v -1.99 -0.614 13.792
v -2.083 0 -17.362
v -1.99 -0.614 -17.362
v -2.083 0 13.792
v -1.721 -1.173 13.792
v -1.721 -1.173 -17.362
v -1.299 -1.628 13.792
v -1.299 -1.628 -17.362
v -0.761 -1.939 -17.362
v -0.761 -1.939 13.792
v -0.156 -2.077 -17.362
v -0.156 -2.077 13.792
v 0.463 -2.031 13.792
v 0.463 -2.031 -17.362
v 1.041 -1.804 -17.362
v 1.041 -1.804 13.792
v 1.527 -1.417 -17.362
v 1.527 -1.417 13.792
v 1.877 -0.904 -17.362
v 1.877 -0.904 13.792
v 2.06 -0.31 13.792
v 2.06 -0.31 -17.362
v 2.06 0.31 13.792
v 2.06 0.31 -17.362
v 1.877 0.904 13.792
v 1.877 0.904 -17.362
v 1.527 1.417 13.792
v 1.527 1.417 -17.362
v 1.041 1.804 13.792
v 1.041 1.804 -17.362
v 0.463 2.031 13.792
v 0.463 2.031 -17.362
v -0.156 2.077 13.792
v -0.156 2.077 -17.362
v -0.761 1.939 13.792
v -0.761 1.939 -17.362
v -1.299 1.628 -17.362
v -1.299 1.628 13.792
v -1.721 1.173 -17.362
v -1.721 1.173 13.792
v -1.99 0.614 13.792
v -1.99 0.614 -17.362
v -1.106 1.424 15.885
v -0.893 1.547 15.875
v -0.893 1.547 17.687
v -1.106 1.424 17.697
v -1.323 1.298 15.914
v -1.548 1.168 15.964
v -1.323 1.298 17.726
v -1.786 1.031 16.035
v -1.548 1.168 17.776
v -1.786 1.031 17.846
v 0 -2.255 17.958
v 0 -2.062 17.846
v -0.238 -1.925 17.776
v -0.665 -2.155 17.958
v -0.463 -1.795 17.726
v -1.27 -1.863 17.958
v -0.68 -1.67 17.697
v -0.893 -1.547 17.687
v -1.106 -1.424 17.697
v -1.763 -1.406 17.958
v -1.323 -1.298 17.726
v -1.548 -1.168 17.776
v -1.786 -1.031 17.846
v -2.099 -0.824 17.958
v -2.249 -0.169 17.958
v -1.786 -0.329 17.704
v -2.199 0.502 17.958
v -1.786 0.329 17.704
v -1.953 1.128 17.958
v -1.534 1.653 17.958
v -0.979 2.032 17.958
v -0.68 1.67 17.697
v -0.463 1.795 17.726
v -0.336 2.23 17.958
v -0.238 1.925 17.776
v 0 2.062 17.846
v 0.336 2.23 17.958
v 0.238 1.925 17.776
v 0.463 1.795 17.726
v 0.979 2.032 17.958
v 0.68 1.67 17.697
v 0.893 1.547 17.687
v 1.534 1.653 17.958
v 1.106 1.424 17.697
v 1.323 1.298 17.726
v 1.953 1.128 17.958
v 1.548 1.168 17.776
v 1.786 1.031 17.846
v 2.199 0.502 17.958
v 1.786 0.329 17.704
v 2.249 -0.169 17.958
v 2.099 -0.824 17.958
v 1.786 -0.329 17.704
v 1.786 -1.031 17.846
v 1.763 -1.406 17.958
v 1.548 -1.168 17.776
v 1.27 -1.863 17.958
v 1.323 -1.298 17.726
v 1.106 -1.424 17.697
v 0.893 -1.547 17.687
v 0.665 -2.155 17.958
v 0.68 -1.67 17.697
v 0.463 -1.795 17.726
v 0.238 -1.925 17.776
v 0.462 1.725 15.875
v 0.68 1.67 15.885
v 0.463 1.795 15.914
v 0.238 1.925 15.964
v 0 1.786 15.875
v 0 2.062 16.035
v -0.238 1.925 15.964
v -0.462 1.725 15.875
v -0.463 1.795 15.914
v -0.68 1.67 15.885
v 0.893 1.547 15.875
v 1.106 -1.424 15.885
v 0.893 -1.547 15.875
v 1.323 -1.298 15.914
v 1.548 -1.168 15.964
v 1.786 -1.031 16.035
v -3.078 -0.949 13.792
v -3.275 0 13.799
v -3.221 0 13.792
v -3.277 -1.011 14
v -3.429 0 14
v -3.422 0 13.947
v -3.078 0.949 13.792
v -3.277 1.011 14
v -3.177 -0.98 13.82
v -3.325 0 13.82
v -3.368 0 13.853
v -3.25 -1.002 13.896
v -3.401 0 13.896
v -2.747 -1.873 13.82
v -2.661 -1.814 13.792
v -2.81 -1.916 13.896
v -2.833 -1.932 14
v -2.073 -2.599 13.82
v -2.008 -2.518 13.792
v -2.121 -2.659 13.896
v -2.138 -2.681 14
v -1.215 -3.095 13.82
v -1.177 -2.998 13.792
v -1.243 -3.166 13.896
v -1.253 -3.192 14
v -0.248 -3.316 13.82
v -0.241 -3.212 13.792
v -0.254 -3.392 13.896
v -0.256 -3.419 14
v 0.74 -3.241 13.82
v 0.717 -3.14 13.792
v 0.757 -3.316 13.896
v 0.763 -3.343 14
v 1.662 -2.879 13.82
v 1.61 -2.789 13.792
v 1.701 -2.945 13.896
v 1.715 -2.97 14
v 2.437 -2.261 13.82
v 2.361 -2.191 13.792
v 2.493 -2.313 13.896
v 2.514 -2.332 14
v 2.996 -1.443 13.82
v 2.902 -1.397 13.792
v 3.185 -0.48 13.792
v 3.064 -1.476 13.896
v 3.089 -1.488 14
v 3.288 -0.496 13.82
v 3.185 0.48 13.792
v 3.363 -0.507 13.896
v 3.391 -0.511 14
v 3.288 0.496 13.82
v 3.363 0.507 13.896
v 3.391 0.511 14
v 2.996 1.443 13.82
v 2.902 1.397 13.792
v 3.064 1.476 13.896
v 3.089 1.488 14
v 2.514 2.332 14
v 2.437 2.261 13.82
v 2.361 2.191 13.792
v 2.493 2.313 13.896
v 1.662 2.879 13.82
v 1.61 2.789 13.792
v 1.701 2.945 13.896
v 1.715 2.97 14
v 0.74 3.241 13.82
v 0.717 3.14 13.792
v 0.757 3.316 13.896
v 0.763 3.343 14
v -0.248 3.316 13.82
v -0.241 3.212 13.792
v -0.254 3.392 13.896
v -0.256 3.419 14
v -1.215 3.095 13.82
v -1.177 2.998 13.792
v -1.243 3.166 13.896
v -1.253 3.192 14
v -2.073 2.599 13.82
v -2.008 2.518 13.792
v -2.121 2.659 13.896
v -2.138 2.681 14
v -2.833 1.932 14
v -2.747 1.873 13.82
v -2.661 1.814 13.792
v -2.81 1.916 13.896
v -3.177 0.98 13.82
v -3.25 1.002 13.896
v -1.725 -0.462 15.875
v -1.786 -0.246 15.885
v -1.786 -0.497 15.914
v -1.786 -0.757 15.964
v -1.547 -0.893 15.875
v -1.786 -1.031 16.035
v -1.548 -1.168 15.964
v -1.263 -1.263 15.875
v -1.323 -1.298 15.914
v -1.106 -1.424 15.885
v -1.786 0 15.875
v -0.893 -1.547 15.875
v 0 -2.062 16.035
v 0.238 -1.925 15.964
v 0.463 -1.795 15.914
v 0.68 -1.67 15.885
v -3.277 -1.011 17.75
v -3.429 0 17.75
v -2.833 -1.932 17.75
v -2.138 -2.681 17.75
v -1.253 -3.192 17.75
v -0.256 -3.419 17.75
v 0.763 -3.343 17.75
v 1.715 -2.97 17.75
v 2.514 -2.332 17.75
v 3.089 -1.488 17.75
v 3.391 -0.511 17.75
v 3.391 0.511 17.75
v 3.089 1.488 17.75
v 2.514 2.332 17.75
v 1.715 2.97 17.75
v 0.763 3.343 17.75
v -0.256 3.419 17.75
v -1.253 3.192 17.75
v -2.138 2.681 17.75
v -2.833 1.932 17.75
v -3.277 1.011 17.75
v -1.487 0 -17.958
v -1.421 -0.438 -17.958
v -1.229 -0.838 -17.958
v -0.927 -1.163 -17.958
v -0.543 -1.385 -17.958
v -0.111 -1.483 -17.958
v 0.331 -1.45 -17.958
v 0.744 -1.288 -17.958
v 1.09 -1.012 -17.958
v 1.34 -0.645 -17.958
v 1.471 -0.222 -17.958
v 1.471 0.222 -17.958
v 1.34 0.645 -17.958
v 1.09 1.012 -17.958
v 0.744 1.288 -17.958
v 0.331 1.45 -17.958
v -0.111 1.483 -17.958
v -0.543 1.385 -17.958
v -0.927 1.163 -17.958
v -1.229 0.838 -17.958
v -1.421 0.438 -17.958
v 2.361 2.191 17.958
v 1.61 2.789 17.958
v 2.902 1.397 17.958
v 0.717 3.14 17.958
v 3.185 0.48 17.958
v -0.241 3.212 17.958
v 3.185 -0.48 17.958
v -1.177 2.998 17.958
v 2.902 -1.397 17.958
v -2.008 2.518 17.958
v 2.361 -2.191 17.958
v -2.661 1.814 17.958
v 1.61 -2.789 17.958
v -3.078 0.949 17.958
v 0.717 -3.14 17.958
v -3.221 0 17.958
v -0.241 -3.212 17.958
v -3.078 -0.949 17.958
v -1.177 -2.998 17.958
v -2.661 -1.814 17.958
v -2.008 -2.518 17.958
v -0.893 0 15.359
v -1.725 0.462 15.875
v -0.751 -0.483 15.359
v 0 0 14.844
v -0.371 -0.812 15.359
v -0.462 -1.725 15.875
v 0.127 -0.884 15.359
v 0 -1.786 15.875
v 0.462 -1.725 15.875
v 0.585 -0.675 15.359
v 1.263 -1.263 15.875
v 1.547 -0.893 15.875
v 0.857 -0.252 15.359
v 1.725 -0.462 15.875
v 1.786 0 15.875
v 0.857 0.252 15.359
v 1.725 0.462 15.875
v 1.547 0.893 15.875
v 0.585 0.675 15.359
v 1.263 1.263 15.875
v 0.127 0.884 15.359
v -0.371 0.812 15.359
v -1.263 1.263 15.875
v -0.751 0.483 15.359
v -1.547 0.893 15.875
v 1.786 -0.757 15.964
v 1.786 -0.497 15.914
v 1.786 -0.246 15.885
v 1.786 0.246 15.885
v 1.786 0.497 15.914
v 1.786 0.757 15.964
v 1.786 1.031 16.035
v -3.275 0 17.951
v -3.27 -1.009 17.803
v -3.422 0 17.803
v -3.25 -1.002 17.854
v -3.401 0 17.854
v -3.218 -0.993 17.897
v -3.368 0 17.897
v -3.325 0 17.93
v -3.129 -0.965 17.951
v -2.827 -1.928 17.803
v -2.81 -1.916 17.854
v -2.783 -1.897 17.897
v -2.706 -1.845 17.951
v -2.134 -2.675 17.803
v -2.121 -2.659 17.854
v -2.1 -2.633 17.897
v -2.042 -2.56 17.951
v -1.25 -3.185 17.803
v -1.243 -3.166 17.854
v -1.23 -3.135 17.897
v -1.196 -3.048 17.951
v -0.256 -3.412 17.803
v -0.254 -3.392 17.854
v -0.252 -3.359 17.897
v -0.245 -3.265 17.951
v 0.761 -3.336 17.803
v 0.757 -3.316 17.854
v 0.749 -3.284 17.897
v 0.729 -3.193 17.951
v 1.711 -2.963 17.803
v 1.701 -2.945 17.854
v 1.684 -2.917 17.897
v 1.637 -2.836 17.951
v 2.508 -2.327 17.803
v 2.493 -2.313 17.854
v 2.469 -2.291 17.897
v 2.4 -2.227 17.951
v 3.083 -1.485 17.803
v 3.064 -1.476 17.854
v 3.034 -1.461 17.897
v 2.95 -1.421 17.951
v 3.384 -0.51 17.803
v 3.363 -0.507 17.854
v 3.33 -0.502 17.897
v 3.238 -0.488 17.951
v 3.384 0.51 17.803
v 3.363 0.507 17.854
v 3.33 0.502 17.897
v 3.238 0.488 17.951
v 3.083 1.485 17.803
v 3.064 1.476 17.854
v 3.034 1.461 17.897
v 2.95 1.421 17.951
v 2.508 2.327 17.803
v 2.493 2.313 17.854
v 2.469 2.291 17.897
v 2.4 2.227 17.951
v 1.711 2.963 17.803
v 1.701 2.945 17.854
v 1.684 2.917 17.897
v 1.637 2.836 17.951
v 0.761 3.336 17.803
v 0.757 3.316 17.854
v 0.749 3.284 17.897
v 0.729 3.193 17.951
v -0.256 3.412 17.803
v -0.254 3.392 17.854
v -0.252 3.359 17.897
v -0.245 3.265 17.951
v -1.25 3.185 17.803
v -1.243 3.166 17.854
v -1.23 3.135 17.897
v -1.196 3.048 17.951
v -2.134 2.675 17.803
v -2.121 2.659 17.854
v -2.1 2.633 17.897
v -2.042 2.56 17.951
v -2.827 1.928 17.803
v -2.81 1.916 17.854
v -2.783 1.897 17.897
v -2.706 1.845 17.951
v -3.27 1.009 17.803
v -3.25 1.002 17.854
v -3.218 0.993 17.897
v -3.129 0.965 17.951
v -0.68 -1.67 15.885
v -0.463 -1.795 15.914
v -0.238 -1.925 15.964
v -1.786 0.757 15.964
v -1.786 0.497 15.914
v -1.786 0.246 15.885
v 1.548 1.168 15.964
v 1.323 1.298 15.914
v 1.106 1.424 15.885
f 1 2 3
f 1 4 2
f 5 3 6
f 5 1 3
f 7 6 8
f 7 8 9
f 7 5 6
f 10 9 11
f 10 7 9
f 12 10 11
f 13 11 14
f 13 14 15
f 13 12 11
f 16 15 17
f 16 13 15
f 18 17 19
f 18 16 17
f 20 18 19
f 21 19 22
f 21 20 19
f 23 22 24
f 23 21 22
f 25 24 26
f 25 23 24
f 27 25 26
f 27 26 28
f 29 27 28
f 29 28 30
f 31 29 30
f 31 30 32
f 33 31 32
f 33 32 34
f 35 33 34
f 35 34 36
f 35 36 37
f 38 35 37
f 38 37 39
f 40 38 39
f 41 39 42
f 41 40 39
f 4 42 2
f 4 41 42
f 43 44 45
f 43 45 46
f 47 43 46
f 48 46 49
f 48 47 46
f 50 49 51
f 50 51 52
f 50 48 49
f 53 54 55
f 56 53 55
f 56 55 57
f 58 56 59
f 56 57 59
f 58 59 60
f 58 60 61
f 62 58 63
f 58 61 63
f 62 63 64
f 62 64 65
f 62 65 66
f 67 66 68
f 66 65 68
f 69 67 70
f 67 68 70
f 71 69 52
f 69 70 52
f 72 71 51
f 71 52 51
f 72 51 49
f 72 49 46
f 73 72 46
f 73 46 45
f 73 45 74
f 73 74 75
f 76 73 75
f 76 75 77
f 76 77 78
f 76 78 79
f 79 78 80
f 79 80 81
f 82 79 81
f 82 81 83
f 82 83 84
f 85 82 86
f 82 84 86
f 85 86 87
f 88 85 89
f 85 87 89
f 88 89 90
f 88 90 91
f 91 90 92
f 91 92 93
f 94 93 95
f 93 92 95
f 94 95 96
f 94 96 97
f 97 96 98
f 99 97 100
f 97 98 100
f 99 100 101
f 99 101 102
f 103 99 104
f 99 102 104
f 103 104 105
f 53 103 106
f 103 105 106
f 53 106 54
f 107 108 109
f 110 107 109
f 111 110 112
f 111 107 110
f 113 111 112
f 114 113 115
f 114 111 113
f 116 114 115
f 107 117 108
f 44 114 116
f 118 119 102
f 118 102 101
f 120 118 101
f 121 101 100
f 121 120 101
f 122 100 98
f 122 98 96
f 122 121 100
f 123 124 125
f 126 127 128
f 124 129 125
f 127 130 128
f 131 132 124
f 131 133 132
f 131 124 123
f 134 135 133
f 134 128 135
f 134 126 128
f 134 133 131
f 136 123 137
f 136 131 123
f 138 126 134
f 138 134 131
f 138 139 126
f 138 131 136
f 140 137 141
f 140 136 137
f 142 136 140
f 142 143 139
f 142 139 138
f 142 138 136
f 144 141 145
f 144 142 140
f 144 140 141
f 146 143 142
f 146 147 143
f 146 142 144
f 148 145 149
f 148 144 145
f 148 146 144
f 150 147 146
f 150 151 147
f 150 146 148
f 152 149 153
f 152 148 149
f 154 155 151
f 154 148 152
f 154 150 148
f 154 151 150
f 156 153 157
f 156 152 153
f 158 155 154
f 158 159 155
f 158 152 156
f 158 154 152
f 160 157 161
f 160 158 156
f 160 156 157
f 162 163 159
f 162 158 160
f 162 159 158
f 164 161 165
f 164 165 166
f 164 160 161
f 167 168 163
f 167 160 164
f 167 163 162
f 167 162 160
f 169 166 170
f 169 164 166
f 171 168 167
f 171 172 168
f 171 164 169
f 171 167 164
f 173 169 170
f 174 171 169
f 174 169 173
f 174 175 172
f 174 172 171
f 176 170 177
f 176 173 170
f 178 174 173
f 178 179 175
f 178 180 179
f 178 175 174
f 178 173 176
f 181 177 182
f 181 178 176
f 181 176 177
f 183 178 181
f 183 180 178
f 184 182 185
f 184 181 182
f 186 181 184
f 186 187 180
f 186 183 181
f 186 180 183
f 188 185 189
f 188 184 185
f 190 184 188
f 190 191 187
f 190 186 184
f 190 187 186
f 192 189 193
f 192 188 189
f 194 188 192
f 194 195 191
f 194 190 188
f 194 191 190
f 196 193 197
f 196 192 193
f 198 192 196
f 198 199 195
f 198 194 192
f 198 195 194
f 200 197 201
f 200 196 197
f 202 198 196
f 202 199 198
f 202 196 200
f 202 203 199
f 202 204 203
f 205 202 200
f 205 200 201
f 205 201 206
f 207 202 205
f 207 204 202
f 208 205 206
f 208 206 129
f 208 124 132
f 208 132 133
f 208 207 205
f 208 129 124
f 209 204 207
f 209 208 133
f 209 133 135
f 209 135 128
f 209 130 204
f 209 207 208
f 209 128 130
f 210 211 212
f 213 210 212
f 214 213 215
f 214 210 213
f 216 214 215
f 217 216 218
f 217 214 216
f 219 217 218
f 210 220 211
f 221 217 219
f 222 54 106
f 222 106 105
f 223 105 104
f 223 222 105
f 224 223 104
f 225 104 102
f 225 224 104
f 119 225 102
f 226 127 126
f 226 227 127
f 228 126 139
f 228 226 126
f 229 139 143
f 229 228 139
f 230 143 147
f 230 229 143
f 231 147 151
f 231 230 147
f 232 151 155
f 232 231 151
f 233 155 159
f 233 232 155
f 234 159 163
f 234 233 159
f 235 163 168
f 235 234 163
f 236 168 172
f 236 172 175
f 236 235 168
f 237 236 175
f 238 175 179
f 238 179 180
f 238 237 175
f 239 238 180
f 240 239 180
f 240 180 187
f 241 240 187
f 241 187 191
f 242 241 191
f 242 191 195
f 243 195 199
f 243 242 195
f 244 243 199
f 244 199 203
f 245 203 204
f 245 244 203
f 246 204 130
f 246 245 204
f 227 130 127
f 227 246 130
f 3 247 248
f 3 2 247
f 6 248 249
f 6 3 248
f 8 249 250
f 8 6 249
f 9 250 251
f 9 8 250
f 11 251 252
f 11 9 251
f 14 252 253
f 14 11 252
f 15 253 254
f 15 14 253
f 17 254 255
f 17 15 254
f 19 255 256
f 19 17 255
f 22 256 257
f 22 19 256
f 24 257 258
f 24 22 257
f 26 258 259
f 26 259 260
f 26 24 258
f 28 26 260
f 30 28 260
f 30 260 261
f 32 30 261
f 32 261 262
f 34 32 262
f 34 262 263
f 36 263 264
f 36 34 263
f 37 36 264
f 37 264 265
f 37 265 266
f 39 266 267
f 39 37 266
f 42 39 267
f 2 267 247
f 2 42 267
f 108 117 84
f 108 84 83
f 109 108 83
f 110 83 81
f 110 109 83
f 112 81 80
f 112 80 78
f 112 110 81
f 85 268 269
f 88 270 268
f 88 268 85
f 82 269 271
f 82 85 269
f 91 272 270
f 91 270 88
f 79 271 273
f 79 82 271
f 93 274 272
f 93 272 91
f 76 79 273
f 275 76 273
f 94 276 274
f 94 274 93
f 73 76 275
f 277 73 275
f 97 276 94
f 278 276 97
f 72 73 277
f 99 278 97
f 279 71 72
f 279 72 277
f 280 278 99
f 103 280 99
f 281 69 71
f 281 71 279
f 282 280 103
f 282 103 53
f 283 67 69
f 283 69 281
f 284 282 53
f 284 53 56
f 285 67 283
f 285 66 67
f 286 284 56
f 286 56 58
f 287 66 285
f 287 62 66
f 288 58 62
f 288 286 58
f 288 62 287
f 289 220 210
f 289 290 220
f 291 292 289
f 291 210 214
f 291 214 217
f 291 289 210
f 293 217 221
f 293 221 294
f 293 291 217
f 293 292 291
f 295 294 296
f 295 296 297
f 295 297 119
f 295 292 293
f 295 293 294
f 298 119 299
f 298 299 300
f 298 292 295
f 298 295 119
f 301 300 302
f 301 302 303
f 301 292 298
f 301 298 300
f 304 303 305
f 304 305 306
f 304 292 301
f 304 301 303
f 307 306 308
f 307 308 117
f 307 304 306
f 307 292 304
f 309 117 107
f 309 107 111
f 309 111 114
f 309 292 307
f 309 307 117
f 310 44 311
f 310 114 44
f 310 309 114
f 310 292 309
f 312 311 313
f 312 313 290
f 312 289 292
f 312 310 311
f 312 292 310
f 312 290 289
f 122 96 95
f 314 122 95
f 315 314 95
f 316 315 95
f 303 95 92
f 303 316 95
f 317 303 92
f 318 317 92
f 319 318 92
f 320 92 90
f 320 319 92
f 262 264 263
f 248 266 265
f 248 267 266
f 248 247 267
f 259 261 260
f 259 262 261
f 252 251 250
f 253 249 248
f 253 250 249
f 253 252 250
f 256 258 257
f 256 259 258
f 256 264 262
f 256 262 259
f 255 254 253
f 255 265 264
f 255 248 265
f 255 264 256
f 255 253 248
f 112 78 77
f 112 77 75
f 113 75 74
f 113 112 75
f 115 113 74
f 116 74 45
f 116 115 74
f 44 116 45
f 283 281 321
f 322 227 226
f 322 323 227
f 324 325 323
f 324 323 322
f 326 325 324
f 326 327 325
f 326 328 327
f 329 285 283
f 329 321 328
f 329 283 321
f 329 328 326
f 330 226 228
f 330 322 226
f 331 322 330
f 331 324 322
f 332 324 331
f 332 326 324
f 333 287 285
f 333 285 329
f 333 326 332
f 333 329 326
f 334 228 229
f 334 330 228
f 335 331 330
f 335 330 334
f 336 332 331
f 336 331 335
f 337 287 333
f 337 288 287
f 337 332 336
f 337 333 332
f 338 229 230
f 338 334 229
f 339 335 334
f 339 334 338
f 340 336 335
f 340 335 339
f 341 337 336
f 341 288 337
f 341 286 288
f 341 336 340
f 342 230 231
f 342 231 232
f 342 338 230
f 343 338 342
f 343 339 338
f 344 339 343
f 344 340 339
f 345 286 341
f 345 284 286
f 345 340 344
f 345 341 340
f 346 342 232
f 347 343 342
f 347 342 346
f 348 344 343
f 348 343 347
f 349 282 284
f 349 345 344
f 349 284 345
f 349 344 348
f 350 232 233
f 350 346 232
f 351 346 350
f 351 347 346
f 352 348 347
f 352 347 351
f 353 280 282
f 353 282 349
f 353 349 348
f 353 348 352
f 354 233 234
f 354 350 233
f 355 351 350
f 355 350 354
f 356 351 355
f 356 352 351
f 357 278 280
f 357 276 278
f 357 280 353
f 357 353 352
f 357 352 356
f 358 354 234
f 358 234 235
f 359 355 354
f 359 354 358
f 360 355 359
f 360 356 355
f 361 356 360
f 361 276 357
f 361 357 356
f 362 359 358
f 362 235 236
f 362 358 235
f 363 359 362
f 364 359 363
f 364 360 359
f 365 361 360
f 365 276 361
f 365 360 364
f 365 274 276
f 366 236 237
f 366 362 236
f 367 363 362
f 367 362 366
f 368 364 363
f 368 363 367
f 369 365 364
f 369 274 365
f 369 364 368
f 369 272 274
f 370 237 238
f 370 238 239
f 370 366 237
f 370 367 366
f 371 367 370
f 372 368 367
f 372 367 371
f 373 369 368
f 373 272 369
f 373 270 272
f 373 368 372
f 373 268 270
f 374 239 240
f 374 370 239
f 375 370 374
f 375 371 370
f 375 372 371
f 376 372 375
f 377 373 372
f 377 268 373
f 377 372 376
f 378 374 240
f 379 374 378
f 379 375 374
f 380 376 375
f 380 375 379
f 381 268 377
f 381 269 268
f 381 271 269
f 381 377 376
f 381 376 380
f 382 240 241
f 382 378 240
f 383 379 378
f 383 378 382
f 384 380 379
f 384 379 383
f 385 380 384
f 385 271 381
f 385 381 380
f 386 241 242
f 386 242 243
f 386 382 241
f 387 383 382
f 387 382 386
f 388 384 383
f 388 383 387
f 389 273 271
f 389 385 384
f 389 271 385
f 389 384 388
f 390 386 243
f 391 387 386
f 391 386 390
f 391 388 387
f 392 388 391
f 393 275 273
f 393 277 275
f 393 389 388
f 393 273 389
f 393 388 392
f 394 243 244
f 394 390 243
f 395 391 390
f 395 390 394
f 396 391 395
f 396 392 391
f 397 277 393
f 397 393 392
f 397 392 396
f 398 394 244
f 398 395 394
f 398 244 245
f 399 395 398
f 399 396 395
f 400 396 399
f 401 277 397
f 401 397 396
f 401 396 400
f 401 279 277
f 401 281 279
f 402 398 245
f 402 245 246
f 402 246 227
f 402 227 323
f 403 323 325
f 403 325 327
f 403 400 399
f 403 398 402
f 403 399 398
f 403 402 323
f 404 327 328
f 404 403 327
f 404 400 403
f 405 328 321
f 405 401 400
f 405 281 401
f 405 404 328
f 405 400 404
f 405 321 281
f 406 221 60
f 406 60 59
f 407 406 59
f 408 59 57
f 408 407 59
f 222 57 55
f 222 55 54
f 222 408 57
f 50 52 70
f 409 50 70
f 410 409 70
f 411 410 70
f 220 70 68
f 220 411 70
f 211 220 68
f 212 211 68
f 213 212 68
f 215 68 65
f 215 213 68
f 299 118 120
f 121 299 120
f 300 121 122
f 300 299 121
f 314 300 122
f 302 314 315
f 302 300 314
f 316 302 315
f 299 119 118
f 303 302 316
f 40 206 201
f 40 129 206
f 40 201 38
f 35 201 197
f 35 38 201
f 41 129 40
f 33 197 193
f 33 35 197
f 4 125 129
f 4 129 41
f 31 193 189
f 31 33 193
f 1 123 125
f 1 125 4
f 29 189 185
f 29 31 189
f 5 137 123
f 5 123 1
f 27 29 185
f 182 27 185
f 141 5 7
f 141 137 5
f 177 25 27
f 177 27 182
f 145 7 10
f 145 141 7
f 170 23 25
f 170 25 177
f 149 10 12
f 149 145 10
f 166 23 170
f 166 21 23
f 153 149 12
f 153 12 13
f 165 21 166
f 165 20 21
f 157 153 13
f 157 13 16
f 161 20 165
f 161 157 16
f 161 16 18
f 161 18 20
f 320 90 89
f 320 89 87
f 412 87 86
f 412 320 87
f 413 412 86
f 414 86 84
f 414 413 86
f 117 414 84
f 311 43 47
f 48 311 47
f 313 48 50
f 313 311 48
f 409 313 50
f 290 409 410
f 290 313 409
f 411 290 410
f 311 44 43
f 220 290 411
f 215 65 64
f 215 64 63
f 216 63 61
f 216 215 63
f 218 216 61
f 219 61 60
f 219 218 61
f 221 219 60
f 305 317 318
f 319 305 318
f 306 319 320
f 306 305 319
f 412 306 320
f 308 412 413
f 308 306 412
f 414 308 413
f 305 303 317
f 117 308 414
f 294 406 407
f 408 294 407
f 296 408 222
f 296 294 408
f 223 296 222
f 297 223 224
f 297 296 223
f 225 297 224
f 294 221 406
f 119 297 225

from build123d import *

# Parameters (mm, degrees)
CUT_EXTRUDE1_REACH = 38.559
CUT_EXTRUDE1_START = 17.9578


with BuildPart() as part:
    # Sketch2 → Revolve1 (revolve)
    with BuildSketch(Plane(origin=(0, 0, 0), x_dir=(0, 0, -1), z_dir=(1, 0, 0))):
        with BuildLine():
            Line((17.9578, 0), (17.9578, 1.4874875))
            Line((17.9578, 1.4874875), (17.3624875, 2.0828))
            Line((17.3624875, 2.0828), (-13.7922, 2.0828))
            Line((-13.7922, 2.0828), (-13.7922, 3.22072))
            ThreePointArc((-13.7922, 3.22072), (-13.8532038, 3.3679962), (-14.00048, 3.429))
            Line((-14.00048, 3.429), (-17.74952, 3.429))
            ThreePointArc((-17.74952, 3.429), (-17.8967962, 3.3679962), (-17.9578, 3.22072))
            Line((-17.9578, 3.22072), (-17.9578, 1.7859375))
            Line((-17.9578, 1.7859375), (-15.875, 1.7859375))
            Line((-15.875, 1.7859375), (-14.843888504, 0))
            Line((-14.843888504, 0), (17.9578, 0))
        make_face()
    revolve(axis=Axis((0, 0, -17.9578), (0, 0, 1)))

    # Cut-Extrude1: up to this cone (the profile starts inside it)
    cut_extrude1_end = Plane(origin=(0, 0, 17.9578), z_dir=(0, 0, 1)).offset(-3.113910496) * Cone(1.732e-06, 82.387359904, 47.566363418, align=(Align.CENTER, Align.CENTER, Align.MIN), mode=Mode.PRIVATE)
    # Sketch3 → Cut-Extrude1 (cut, up to the surface)
    with BuildSketch(Plane.XY.offset(CUT_EXTRUDE1_START), mode=Mode.PRIVATE) as cut_extrude1_sk1:
        Polygon((-1.7859375, 1.031111496), (-1.7859375, -1.031111496), (0, -2.062222993), (1.7859375, -1.031111496), (1.7859375, 1.031111496), (0, 2.062222993), align=None)
    cut_extrude1_tool1 = extrude(cut_extrude1_sk1.sketch, amount=-CUT_EXTRUDE1_REACH, mode=Mode.PRIVATE) & cut_extrude1_end
    add(cut_extrude1_tool1.solids().sort_by_distance((0, 0, 17.9578))[0], mode=Mode.SUBTRACT)

    # Cut-Extrude2 cone 1 section (through the dimple's axis) → Cut-Extrude2 (revolve, cut)
    with BuildSketch(Plane(origin=(0, 0, 17.9578), x_dir=(0, -1, 0), z_dir=(1, 0, 0))):
        Polygon((0, 0), (2.255305827, 0), (0, 1.302101426), align=None)
    revolve(axis=Axis((0, 0, 17.9578), (0, 0, -1)), mode=Mode.SUBTRACT)


solid = part.part
